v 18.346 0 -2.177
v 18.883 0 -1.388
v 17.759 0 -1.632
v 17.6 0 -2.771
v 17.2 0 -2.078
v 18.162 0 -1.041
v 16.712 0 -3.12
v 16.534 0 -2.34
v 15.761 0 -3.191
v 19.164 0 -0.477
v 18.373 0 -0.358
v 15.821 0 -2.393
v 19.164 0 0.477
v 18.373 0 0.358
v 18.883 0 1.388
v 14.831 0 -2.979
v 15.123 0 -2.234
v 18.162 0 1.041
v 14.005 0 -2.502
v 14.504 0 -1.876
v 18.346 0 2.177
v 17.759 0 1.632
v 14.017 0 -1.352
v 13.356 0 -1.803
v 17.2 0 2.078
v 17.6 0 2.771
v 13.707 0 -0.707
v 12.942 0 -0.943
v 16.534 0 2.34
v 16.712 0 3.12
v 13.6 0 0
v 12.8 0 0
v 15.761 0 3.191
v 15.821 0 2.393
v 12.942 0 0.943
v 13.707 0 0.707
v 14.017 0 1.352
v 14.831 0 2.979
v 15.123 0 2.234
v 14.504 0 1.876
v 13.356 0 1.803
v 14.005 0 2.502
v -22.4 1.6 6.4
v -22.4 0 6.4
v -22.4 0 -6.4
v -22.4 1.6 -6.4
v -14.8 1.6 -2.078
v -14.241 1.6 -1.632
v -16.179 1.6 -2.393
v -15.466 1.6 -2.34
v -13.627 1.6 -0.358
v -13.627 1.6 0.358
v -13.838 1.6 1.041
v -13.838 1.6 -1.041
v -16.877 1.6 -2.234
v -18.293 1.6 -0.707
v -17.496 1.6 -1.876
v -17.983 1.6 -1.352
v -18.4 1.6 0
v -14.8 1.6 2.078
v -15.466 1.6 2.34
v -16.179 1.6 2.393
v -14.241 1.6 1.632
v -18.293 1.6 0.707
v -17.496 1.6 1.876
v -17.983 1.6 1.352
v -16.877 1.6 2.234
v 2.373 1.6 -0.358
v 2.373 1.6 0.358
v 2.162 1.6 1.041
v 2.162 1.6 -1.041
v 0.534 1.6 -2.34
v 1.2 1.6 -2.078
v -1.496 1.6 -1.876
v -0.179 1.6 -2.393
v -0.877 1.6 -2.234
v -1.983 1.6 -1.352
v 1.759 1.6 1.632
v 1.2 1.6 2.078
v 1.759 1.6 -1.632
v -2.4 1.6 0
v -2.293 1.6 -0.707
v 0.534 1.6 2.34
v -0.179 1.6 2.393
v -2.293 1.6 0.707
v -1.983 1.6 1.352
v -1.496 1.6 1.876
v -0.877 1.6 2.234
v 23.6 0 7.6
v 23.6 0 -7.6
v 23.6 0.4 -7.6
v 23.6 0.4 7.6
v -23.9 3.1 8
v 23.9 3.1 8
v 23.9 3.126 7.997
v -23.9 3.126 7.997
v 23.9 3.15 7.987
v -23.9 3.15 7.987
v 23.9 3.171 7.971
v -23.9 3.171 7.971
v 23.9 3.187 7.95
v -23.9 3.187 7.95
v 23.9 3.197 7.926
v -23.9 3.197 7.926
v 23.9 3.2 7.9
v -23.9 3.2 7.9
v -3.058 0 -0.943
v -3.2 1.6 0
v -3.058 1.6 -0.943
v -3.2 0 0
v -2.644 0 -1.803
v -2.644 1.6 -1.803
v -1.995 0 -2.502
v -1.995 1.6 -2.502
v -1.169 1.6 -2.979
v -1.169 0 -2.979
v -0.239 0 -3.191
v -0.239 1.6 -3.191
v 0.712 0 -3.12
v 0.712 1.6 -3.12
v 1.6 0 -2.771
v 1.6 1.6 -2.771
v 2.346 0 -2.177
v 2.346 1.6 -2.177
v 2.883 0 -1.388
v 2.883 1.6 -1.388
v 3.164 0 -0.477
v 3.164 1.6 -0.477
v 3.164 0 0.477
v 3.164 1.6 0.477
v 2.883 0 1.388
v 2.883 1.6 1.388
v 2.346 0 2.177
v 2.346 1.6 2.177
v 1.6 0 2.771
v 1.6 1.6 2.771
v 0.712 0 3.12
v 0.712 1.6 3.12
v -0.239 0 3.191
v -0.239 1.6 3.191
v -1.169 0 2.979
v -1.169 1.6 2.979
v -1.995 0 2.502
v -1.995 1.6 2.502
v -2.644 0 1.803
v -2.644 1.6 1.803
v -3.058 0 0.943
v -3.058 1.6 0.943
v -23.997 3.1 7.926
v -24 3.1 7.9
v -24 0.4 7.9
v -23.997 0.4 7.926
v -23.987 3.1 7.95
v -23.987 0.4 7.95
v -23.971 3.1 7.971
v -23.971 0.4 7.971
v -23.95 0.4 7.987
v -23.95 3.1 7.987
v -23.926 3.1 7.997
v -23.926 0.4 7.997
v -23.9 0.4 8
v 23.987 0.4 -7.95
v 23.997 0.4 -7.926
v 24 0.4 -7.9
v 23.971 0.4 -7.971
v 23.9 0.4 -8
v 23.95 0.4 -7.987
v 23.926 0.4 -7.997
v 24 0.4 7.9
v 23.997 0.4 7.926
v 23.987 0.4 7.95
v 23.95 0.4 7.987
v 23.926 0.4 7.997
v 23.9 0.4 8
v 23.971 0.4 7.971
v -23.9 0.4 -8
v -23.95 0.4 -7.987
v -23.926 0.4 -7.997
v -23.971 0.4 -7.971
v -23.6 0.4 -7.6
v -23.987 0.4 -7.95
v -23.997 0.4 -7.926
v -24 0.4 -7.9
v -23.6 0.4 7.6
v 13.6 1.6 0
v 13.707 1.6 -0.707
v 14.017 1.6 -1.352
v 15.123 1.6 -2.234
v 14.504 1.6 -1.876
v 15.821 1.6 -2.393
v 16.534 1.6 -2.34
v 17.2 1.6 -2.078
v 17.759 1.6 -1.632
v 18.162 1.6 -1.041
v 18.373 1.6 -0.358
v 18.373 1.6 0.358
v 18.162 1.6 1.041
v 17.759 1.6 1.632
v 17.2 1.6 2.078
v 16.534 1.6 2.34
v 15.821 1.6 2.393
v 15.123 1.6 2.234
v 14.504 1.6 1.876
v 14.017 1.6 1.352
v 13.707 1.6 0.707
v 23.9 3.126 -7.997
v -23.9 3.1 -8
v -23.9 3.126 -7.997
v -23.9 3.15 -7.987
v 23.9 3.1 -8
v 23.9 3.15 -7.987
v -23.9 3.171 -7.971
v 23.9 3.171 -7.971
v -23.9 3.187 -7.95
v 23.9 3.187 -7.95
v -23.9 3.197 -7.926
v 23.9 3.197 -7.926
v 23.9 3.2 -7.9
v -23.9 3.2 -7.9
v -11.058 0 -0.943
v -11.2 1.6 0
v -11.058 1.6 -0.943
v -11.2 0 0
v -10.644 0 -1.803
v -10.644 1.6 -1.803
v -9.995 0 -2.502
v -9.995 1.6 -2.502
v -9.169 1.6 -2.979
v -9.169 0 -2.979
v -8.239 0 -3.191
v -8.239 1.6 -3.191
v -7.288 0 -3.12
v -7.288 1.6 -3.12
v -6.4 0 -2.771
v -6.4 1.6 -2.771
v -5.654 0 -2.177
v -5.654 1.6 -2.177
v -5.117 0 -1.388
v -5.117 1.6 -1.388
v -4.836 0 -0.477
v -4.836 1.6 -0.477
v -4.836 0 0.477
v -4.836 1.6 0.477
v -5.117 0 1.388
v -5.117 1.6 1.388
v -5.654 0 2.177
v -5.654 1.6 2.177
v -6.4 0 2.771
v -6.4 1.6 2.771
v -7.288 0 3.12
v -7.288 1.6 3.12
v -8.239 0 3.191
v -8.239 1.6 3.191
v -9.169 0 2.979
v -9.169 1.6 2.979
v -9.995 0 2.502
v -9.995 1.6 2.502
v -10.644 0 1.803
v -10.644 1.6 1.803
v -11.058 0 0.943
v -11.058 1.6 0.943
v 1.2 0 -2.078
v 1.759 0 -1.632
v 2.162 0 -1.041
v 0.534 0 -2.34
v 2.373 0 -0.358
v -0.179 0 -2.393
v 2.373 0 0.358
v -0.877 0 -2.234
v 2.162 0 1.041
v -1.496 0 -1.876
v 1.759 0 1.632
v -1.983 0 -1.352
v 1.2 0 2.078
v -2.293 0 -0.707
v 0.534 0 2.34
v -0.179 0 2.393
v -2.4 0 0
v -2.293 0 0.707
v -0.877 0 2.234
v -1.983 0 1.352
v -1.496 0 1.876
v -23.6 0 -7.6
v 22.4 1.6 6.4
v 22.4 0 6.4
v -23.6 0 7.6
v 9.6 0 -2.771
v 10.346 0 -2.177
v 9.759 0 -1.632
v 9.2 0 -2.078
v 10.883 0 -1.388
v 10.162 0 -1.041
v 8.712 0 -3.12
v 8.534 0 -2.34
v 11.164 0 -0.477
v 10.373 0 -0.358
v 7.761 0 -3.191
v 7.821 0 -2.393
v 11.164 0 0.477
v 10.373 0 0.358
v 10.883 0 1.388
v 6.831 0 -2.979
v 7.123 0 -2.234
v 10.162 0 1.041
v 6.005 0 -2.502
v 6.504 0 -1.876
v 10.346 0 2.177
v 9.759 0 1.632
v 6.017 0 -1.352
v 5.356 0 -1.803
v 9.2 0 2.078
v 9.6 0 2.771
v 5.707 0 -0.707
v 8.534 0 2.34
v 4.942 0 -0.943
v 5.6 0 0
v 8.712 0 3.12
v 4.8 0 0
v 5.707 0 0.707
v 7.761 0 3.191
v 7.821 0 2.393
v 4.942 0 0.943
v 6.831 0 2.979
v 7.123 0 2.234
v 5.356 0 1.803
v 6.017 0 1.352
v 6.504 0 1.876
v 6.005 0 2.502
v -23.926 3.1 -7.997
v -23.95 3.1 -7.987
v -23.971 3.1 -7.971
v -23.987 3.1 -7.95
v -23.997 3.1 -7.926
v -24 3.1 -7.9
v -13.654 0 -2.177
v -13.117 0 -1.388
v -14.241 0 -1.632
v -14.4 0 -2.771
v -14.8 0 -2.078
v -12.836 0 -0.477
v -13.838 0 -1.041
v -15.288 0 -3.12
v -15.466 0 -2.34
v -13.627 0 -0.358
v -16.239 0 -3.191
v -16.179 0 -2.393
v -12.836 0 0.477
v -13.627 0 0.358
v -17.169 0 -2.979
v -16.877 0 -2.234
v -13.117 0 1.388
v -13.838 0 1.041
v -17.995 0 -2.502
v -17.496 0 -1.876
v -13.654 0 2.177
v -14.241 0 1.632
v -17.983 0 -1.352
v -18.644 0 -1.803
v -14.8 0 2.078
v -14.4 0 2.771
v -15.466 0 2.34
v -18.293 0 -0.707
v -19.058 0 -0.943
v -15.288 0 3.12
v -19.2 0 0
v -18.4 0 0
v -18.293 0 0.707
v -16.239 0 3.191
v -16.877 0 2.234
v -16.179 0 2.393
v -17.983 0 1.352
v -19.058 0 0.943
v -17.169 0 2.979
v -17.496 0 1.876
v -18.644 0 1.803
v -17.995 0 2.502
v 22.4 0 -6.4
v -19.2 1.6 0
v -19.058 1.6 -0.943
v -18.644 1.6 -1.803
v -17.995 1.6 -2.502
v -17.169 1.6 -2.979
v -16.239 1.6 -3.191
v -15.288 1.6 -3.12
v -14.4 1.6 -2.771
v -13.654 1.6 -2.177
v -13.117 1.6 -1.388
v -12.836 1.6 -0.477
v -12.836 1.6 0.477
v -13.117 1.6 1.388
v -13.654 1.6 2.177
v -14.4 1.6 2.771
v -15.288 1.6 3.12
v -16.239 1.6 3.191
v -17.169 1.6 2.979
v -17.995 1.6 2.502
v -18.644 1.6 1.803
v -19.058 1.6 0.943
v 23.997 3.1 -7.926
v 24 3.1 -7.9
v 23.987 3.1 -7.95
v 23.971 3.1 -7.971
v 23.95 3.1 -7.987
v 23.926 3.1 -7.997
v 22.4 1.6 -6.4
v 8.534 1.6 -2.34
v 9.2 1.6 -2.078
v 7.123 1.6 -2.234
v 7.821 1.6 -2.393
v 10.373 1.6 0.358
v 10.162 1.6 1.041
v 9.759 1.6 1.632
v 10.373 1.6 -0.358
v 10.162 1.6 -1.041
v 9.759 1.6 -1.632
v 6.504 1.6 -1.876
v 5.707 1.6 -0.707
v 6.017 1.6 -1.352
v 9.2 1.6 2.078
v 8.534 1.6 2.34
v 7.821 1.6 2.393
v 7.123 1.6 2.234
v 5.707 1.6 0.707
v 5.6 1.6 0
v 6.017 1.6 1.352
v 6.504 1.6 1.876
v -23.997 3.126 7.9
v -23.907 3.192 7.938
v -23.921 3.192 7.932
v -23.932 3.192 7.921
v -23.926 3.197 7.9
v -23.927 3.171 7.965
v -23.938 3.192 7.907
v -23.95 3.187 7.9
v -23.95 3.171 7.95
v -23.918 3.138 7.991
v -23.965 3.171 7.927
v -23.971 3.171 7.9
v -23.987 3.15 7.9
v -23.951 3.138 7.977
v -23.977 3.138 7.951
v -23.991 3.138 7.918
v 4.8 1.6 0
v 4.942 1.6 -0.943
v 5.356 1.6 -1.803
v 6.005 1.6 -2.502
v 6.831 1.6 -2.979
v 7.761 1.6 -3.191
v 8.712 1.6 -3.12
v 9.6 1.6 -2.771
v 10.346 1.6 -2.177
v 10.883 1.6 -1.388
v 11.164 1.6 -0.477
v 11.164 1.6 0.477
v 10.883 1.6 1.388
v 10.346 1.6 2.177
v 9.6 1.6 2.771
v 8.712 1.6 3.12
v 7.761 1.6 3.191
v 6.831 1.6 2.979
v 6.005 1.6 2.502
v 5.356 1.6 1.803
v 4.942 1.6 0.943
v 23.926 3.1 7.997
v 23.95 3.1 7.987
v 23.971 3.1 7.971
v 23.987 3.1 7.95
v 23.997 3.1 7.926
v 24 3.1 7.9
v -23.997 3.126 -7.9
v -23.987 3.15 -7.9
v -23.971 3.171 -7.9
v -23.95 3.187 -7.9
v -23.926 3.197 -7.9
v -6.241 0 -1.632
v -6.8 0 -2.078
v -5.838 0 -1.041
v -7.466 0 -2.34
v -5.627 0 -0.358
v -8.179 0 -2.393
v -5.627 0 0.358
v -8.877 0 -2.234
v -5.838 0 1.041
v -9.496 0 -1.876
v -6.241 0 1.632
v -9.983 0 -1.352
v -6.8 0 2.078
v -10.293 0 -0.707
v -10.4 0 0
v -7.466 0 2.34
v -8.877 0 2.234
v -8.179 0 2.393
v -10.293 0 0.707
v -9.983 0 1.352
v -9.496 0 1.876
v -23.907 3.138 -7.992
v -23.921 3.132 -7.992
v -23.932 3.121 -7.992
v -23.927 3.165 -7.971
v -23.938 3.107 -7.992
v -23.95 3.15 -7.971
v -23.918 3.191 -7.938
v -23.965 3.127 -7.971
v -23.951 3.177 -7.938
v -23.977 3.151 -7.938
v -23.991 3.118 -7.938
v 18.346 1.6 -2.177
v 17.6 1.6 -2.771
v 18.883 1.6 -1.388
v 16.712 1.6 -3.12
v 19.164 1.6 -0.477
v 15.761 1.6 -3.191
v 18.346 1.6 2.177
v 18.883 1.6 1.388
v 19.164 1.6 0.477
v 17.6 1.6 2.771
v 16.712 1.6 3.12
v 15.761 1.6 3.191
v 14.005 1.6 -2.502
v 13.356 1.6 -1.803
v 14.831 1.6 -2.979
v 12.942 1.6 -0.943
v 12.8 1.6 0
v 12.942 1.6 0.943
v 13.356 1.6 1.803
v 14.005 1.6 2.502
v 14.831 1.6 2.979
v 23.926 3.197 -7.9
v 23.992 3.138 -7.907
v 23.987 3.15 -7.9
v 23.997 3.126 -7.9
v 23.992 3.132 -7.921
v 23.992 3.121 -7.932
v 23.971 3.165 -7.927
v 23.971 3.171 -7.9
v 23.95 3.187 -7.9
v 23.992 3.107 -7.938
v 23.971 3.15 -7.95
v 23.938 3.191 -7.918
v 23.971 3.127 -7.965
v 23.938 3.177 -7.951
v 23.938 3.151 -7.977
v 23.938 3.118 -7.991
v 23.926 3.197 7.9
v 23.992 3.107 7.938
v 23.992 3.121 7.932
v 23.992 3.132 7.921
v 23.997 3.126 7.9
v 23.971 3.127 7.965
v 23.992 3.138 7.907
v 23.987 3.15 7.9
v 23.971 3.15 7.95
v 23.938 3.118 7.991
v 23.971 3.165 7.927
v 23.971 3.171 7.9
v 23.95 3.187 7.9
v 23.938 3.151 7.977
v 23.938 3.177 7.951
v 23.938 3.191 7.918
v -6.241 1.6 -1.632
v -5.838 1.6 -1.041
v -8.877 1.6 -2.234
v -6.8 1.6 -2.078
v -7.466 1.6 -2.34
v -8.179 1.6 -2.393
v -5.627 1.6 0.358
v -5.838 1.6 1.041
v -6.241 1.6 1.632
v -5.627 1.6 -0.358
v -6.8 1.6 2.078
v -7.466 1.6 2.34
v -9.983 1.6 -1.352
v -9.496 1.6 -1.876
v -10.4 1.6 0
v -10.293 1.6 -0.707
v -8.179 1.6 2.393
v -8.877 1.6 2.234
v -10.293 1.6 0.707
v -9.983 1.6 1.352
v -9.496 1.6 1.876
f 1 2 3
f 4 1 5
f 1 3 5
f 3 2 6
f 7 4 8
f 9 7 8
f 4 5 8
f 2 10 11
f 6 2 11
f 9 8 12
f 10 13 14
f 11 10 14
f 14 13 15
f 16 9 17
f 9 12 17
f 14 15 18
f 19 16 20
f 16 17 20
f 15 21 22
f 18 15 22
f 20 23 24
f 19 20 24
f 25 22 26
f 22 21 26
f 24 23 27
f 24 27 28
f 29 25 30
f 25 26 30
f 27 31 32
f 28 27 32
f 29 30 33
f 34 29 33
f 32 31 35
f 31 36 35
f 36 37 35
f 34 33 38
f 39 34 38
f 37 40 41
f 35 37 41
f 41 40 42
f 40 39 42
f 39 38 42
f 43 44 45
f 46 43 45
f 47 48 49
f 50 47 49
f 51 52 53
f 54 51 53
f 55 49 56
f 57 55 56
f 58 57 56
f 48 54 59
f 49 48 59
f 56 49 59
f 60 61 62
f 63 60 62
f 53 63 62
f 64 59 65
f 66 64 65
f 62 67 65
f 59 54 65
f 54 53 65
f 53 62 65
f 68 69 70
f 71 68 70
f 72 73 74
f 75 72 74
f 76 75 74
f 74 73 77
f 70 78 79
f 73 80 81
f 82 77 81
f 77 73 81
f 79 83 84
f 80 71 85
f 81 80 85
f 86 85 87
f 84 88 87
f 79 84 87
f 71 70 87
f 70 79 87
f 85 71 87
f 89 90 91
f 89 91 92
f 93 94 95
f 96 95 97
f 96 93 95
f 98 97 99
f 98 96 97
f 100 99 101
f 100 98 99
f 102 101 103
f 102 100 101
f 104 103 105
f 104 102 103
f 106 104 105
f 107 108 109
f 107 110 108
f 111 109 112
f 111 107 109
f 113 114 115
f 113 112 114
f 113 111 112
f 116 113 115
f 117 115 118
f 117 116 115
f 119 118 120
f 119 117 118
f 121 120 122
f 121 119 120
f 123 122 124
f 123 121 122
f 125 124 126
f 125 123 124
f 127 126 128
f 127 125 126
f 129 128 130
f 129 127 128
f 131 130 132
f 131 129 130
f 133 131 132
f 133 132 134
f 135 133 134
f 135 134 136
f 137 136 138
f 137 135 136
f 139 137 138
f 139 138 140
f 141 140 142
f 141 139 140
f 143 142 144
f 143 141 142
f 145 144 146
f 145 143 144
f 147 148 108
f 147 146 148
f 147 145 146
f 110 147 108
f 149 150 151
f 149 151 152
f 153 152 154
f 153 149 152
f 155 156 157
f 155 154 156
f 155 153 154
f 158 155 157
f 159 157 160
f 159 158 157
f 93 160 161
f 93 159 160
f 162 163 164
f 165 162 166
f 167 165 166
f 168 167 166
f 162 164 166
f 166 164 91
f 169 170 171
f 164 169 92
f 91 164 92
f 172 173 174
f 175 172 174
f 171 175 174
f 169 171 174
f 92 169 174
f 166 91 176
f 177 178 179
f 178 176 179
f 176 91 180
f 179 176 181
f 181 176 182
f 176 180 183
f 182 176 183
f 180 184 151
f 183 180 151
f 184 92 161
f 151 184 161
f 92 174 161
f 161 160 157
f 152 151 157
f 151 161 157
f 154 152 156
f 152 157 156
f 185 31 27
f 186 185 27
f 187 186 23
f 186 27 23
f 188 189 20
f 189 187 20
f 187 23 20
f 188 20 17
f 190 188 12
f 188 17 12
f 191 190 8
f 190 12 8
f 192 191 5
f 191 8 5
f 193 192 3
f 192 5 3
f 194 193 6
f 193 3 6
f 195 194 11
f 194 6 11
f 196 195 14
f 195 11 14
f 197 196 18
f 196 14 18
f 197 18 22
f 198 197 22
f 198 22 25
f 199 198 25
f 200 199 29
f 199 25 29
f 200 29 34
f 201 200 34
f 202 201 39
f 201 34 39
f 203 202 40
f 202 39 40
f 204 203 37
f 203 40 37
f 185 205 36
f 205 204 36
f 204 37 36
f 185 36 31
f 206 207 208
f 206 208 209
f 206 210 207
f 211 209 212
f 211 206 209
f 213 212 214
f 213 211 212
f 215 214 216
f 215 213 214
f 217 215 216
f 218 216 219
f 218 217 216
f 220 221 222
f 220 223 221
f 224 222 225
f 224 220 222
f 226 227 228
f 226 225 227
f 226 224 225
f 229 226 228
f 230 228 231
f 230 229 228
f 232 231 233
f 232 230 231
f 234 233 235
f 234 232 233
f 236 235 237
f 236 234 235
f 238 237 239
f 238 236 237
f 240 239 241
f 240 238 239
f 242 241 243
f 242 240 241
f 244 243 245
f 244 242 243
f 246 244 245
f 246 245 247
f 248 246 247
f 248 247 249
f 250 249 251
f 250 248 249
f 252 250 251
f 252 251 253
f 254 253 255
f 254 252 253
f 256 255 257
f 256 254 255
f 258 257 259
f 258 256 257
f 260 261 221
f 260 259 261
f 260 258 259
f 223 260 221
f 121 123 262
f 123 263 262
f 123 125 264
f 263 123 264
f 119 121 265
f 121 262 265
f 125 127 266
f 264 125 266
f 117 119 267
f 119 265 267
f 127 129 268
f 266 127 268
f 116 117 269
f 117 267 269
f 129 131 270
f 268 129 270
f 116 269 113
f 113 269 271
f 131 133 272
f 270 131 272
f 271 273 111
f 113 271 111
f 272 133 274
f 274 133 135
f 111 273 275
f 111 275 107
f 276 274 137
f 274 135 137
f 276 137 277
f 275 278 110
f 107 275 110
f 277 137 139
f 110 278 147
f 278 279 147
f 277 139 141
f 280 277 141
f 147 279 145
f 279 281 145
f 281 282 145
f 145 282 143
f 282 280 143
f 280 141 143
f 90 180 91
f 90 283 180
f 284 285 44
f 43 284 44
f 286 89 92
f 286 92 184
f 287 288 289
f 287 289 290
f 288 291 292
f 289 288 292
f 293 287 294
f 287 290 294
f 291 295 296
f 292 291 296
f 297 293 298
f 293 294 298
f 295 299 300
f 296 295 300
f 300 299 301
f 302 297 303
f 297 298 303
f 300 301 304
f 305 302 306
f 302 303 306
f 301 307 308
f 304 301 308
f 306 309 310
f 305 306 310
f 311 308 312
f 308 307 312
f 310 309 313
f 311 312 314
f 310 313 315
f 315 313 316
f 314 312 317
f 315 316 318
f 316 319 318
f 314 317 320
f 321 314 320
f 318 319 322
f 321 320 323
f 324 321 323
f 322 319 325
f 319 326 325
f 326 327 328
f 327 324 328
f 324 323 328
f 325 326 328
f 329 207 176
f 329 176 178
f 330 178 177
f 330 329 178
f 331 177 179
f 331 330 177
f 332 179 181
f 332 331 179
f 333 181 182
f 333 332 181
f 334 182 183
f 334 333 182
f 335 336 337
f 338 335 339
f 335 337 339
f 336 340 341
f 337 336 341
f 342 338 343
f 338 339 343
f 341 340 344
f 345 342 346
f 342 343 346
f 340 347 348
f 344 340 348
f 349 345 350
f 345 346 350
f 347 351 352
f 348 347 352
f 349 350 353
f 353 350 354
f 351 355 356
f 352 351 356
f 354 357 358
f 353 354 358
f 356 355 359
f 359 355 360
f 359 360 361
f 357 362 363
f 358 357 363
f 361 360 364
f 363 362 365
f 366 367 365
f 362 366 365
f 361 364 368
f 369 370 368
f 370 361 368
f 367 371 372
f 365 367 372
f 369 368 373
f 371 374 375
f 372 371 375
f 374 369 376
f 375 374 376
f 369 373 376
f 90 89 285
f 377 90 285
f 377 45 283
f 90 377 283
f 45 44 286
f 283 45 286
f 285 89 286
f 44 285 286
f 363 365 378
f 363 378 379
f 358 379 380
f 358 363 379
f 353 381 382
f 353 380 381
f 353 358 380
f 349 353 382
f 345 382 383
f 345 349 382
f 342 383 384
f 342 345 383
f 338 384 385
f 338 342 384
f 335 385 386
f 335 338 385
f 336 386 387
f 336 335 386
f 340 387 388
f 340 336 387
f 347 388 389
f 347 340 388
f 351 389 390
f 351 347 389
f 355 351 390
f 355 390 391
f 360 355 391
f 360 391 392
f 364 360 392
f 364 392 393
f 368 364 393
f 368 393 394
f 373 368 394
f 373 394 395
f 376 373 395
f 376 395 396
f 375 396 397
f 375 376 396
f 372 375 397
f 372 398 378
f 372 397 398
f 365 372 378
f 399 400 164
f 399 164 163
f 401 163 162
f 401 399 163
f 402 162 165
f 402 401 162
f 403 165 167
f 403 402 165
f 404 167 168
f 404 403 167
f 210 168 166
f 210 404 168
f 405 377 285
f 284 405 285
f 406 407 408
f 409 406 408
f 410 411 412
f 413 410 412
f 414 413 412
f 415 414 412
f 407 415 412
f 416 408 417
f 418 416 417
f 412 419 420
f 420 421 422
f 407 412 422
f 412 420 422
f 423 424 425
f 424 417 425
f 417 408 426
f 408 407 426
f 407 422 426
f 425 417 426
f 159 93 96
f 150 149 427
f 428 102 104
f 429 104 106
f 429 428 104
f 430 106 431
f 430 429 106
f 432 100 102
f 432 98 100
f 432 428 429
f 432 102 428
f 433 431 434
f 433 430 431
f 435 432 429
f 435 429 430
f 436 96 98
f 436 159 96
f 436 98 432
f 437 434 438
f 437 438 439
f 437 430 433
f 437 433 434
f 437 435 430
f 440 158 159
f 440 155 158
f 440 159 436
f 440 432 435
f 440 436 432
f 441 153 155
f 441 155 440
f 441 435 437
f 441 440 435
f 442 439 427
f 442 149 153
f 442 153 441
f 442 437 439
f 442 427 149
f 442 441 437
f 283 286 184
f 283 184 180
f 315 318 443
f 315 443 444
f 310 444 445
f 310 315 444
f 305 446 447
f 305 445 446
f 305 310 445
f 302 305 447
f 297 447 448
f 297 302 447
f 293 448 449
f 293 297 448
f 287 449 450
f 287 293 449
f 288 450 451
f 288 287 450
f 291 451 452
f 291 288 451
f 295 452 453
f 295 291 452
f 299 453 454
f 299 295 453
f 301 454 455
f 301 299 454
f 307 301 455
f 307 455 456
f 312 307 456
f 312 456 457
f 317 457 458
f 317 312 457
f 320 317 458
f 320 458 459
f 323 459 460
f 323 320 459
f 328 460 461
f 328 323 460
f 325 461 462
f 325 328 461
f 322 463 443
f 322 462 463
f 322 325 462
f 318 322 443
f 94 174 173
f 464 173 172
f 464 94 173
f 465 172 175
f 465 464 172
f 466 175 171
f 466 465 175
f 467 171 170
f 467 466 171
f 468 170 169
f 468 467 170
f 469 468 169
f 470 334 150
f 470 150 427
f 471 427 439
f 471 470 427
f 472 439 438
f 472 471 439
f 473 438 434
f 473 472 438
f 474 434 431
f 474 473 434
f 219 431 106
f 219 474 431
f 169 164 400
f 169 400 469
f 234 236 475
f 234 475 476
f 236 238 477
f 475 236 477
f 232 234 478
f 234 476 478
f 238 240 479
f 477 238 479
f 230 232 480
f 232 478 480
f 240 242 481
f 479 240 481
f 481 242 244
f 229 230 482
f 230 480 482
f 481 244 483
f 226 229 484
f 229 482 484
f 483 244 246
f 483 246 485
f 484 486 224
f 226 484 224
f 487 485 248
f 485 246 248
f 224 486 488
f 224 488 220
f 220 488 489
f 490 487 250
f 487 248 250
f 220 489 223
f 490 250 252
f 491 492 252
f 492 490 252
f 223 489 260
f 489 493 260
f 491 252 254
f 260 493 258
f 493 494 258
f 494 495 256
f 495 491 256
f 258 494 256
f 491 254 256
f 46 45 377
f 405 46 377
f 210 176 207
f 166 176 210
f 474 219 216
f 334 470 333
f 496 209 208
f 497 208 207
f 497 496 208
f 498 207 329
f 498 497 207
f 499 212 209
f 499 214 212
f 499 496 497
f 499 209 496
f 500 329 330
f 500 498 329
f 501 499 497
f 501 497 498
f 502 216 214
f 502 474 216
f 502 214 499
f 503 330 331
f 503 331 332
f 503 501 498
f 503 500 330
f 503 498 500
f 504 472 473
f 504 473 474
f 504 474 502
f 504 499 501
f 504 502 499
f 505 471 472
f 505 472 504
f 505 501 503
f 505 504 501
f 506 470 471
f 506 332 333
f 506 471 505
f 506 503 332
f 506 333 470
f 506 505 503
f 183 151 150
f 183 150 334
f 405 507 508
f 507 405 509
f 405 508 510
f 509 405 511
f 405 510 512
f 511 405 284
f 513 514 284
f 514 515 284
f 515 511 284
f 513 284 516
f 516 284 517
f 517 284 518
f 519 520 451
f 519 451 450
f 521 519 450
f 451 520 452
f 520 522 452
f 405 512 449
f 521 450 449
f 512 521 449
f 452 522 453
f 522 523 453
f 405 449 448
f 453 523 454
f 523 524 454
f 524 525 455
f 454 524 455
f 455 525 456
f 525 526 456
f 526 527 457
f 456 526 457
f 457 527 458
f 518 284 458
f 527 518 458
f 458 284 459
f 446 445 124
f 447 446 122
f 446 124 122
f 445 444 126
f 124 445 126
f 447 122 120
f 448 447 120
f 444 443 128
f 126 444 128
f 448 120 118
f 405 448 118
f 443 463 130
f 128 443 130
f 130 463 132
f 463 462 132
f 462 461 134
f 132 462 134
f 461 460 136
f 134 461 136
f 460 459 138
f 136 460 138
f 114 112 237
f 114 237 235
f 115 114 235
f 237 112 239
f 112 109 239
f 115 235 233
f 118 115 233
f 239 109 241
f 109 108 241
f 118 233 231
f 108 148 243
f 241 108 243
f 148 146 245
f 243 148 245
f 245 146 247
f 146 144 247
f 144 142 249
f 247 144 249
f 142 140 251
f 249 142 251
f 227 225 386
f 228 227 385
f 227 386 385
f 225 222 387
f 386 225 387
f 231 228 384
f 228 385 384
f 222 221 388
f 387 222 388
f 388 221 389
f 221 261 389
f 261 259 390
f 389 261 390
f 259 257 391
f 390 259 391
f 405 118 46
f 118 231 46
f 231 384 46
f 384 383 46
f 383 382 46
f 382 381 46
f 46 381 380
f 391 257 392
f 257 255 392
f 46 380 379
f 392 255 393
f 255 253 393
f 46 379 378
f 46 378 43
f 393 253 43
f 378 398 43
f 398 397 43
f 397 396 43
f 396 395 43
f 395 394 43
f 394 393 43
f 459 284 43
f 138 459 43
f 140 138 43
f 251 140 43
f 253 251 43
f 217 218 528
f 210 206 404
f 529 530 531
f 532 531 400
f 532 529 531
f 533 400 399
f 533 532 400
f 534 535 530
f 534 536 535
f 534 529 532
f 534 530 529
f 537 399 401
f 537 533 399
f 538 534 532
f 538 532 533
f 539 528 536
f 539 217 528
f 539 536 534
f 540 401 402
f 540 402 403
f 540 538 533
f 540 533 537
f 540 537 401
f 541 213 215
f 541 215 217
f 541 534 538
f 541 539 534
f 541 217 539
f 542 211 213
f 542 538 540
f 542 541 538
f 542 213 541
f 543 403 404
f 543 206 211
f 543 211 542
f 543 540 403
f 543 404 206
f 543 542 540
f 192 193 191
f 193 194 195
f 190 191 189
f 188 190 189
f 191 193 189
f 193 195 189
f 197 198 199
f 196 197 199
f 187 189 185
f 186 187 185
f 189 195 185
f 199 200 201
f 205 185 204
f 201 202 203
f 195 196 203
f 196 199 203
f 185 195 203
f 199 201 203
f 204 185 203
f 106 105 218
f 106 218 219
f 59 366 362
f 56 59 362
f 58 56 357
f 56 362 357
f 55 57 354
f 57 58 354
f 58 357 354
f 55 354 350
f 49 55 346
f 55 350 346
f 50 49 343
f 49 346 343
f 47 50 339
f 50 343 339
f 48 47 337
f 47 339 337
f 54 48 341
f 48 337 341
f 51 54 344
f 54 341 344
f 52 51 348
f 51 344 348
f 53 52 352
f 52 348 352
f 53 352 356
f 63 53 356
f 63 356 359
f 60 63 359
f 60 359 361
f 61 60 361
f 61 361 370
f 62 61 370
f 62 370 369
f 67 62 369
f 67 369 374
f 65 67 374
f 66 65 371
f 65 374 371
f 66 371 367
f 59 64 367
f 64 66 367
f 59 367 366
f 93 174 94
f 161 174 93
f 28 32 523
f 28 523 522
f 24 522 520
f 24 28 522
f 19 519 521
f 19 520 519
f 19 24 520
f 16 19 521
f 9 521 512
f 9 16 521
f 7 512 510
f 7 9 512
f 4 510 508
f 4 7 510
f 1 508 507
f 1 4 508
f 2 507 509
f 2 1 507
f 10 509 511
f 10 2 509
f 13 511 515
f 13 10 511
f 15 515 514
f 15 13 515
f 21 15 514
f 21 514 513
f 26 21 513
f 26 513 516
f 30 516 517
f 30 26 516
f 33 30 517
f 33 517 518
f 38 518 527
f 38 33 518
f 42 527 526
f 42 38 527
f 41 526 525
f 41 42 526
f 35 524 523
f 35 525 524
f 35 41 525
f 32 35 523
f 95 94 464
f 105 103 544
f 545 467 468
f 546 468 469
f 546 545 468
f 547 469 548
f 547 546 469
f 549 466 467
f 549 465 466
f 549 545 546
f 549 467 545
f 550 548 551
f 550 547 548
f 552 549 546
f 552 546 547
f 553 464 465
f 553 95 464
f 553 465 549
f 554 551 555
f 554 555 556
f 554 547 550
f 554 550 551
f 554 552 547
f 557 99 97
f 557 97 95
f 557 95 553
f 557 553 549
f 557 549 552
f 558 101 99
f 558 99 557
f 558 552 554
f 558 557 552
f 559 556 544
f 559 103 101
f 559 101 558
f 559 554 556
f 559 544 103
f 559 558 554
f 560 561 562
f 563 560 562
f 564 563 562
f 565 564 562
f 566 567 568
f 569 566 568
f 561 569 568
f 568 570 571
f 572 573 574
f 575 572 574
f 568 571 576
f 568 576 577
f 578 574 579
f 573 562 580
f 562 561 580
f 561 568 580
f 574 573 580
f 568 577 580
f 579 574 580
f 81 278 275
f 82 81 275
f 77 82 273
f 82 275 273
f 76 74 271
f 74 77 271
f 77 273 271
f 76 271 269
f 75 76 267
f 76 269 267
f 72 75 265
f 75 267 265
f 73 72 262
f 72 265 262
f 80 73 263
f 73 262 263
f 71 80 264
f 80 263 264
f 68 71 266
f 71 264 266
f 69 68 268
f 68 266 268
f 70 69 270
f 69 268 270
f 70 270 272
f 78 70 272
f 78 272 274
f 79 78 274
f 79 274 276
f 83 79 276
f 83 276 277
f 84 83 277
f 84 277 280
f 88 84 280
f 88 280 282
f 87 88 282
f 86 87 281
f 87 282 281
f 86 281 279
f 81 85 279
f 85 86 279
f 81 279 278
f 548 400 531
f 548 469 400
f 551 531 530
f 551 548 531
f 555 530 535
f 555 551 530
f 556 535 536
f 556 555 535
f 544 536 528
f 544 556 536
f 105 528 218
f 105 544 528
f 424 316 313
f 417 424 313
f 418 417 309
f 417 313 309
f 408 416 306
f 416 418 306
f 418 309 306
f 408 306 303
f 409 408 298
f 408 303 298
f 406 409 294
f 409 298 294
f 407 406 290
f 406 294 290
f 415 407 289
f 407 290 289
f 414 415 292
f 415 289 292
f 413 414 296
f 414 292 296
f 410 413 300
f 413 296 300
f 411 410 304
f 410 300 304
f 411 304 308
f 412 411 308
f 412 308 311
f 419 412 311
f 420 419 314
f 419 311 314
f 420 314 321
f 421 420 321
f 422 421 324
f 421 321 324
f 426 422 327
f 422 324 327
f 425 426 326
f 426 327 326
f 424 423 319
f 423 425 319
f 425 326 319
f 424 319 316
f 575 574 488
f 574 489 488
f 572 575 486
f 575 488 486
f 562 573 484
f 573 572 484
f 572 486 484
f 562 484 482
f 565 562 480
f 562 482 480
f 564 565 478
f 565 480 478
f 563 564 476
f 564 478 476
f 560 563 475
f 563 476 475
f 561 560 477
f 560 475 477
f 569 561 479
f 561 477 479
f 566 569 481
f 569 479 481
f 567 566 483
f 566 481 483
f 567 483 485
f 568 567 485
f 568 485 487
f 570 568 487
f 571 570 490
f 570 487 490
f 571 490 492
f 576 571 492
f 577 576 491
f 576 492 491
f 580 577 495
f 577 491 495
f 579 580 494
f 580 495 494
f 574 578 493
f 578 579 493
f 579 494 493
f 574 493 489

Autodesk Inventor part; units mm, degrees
ref_plane "YZ Plane" through (0, 0, 0) normal (1, 0, 0) x (0, 1, 0)
ref_plane "XZ Plane" through (0, 0, 0) normal (0, 1, 0) x (-1, 0, 0)
ref_plane "XY Plane" through (0, 0, 0) normal (0, 0, 1) x (1, 0, 0)
sketch "Sketch2" plane through (0, 0, 0) normal (0, 1, 0) x (-1, 0, 0)
  line L0 (-24, 8) -> (24, 8)
  line L1 (24, 8) -> (24, -8)
  line L2 (24, -8) -> (-24, -8)
  line L3 (-24, -8) -> (-24, 8)
  line L4 (-23.6, 7.6) -> (23.6, 7.6)
  line L5 (23.6, 7.6) -> (23.6, -7.6)
  line L6 (23.6, -7.6) -> (-23.6, -7.6)
  line L7 (-23.6, -7.6) -> (-23.6, 7.6)
  circle A0 centre (0, 0) radius 2.4
  circle A1 centre (0, 0) radius 3.2
  circle A2 centre (-8, 0) radius 2.4
  circle A3 centre (-8, 0) radius 3.2
  circle A4 centre (-16, 0) radius 2.4
  circle A5 centre (-16, 0) radius 3.2
  circle A6 centre (8, 0) radius 2.4
  circle A7 centre (8, 0) radius 3.2
  circle A8 centre (16, 0) radius 2.4
  circle A9 centre (16, 0) radius 3.2
  line L8 (16, 0) -> (8, 0) construction
  line L9 (8, 0) -> (0, 0) construction
  line L10 (0, 0) -> (-8, 0) construction
  line L11 (-8, 0) -> (-16, 0) construction
  line L12 (-22.4, 6.4) -> (22.4, 6.4)
  line L13 (22.4, 6.4) -> (22.4, -6.4)
  line L14 (22.4, -6.4) -> (-22.4, -6.4)
  line L15 (-22.4, -6.4) -> (-22.4, 6.4)
  circle A10 centre (-20, 4) radius 2.4 construction
  circle A11 centre (-20, -4) radius 2.4 construction
  circle A12 centre (20, 4) radius 2.4 construction
  circle A13 centre (20, -4) radius 2.4 construction
  point P0 (0, 8)
  point P1 (-24, 0)
  point P2 (0, 7.6)
  point P3 (-23.6, 0)
  point P4 (0, 6.4)
  point P5 (-22.4, 0)
  dimension "d0" = 16
  dimension "d1" = 48
  dimension "d2" = 0.4
  dimension "d3" = 0.4
  dimension "d4" = 4.8
  dimension "d5" = 6.4
  dimension "d6" = 8
  dimension "d7" = 1.6
  dimension "d8" = 1.6
  dimension "d15" = 4.8
extrude "Extrusion1" add sketch "Sketch2" along normal blind 3.2 contours L0 L1 L2 L3 | L4 L5 L6 L7 | A0 | A1 | A2 | A3 | A4 | A5 | A6 | A7 | A8 | A9 | L12 L13 L14 L15
extrude "Extrusion2" cut sketch "Sketch2" along normal blind 0.4 contours L0 L1 L2 L3
extrude "Extrusion3" cut sketch "Sketch2" along normal blind 1.6 contours A0 | A2 | A4 | A6 | A8 | L12 L13 L14 L15
fillet "Fillet1" radius 0.1 8 edges at (-24, 1.8, 8) (0, 3.2, 8) (-24, 3.2, 0) (-24, 1.8, -8) (0, 3.2, -8) (24, 1.8, -8) (24, 3.2, 0) (24, 1.8, 8)
sketch "Skizze3" plane through (0, 3.2, 0) normal (0, 1, 0) x (1, 0, 0)
  line L0 (23.9, 8) -> (-23.9, 8) projected
  line L1 (-24, 7.9) -> (-24, -7.9) projected
  line L2 (-23.9, -8) -> (23.9, -8) projected
  line L3 (23.9, -7.9) -> (-23.9, -7.9) projected
  line L4 (-24.9, -8.5) -> (-24.9, 8.1) construction
  line L5 (-24.9, 8.1) -> (28.7985, 8.1) construction
  line L6 (28.7985, 8.1) -> (28.7985, -8.5) construction
  line L7 (28.7985, -8.5) -> (-24.9, -8.5) construction
  point P0 (0, 0)
  dimension "d43" = 0.1
  dimension "d44" = 0.6
  dimension "d45" = 0.9
decal "Aufkleber1"
equation "\"d0\" = 2 * lu"
equation "\"d1\" = 6 * lu"
equation "\"d2\" = gw"
equation "\"d3\" = gw"
equation "\"d4\" = kd"
equation "\"d6\" = lu"
equation "\"d7\" = wall"
equation "\"d8\" = wall"
equation "\"d15\" = kd"
equation "\"d9\" = 0.333333 * lh"
equation "\"d11\" = gh"
equation "\"d13\" = 0.333333 * lh - topthk"
equation "\"d16\" = lf"
equation "\"lu\" = 8"
equation "\"gw\" = 0.4"
equation "\"kd\" = 4.8"
equation "\"wall\" = 1.6"
equation "\"lh\" = 9.6"
equation "\"gh\" = 0.4"
equation "\"topthk\" = 1.6"
equation "\"lf\" = 0.1"
properties part number "42146_69729_2" material "ABS Plastic"
